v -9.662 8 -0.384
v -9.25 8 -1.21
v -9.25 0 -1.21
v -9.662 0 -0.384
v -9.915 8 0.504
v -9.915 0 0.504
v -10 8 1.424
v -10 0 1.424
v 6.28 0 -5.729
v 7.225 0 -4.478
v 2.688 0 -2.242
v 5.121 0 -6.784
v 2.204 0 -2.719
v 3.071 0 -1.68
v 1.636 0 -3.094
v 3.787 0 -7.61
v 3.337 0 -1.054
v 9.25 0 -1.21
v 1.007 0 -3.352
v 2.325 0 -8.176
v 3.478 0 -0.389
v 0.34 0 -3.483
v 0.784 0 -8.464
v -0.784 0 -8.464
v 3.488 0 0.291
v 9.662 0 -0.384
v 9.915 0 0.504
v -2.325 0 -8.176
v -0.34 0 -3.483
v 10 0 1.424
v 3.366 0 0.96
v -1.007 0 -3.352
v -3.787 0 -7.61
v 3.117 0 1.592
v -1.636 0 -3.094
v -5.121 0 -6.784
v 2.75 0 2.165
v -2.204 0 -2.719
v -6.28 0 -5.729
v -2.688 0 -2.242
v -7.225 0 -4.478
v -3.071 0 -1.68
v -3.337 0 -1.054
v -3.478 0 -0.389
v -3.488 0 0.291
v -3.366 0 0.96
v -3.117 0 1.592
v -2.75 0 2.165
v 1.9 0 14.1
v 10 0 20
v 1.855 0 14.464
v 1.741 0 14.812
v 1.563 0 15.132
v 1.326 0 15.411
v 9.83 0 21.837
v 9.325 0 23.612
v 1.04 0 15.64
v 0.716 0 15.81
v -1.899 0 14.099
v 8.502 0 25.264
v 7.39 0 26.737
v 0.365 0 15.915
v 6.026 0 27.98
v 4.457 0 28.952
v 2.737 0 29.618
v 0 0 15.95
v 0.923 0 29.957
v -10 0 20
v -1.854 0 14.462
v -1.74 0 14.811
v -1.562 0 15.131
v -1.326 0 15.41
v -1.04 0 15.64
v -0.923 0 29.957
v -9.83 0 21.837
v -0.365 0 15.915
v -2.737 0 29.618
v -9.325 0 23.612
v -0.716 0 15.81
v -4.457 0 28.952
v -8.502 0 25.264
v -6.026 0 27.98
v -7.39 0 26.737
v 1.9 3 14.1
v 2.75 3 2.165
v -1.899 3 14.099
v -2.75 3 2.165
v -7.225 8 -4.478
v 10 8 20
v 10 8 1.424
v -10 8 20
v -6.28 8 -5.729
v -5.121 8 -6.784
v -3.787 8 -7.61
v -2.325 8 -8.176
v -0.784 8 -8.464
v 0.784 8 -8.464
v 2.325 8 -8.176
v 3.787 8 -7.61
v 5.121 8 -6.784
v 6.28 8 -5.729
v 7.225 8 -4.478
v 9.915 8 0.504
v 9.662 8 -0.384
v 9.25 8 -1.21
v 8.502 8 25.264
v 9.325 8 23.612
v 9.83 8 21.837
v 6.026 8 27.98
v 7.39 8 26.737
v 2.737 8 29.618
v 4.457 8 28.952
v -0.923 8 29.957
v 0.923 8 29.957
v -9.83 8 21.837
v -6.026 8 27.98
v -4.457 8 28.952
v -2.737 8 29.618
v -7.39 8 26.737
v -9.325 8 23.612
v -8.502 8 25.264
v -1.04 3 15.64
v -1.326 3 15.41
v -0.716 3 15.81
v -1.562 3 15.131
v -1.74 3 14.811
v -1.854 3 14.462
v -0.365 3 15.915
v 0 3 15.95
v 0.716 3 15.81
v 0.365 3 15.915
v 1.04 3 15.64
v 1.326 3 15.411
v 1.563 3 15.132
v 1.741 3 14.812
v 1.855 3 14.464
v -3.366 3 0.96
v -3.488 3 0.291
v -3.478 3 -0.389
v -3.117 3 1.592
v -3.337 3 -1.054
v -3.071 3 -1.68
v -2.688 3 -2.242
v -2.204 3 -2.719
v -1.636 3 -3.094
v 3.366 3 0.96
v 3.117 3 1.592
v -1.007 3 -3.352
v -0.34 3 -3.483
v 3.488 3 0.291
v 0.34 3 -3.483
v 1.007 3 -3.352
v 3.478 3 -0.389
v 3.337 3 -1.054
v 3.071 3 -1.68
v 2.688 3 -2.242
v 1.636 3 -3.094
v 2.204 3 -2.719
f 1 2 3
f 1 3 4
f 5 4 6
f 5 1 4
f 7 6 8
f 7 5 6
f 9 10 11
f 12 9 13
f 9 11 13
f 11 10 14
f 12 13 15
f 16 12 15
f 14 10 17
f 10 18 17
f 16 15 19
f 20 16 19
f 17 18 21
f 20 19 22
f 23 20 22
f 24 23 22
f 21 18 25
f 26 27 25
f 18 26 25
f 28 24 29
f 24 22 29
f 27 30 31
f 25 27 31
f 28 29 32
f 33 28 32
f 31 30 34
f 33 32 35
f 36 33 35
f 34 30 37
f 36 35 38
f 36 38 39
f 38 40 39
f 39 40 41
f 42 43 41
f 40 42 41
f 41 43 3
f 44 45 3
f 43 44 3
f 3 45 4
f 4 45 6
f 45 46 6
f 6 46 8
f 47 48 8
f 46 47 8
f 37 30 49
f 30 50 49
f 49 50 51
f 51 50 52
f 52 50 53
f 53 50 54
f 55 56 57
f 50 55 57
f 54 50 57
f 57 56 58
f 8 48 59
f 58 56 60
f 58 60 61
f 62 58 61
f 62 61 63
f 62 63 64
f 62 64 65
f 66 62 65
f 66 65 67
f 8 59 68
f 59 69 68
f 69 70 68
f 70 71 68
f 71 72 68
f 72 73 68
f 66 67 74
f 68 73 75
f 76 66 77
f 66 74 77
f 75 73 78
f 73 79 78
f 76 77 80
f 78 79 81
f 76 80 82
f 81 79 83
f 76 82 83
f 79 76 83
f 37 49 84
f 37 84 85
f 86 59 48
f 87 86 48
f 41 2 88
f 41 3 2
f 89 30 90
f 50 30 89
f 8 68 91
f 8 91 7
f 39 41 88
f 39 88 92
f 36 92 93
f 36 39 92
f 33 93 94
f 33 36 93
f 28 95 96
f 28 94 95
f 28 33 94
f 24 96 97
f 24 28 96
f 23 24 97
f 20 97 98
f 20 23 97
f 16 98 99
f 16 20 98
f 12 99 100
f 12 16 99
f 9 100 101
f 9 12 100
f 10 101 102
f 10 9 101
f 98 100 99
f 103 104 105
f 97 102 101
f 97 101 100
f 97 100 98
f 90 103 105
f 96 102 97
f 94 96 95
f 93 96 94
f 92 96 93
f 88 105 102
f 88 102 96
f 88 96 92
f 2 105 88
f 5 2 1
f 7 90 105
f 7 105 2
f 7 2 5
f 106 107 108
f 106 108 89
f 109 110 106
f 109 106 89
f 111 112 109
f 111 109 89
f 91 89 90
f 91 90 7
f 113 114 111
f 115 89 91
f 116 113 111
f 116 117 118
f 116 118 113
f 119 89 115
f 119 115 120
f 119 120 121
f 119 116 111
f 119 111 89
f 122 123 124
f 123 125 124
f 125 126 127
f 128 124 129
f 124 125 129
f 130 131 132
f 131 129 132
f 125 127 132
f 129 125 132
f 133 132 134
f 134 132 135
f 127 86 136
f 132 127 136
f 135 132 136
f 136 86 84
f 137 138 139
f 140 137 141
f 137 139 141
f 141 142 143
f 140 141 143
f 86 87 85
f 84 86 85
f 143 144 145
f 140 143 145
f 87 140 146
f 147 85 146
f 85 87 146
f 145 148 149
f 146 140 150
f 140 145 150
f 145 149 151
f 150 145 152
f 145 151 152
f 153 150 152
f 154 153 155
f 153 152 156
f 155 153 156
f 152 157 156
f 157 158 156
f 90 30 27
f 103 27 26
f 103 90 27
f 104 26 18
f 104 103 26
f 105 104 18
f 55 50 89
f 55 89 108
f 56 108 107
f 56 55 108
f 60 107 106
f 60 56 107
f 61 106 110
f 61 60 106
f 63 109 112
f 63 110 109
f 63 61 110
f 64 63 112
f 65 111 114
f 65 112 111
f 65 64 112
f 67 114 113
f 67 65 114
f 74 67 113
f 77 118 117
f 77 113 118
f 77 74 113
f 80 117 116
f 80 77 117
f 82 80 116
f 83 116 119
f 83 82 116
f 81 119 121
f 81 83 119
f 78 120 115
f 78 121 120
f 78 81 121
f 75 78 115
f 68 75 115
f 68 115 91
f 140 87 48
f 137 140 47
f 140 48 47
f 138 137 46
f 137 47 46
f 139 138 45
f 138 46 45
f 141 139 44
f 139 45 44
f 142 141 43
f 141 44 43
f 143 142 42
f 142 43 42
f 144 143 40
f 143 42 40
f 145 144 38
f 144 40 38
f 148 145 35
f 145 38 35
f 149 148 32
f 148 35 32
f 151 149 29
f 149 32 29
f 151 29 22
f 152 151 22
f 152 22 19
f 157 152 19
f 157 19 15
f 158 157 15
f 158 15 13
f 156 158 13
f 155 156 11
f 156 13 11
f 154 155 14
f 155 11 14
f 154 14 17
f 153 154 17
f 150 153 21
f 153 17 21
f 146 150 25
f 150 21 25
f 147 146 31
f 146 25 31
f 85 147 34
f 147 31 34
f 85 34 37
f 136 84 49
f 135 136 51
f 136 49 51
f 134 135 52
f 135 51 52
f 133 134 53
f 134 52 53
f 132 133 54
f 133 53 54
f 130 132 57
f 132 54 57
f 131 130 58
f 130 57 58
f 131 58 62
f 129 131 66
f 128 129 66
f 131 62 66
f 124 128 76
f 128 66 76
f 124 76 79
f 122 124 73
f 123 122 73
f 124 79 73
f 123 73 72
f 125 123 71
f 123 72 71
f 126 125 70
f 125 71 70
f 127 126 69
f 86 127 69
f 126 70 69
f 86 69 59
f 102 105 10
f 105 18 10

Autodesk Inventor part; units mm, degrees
ref_plane "YZ Plane" through (0, 0, 0) normal (1, 0, 0) x (0, 1, 0)
ref_plane "XZ Plane" through (0, 0, 0) normal (0, 1, 0) x (-1, 0, 0)
ref_plane "XY Plane" through (0, 0, 0) normal (0, 0, 1) x (1, 0, 0)
sketch "Sketch1" plane through (0, 0, 0) normal (0, 1, 0) x (-1, 0, 0)
  arc A0 (-2.75, 2.1651) -> (2.75, 2.1651) centre (0, 0) ccw
  line L0 (-1.9, 14.1) -> (-2.75, 2.1651)
  line L1 (1.8987, 14.0987) -> (2.75, 2.1651)
  arc A1 (1.8987, 14.0987) -> (-1.9, 14.1) centre (-0.0007, 14.05) ccw
  circle A2 centre (0, 0) radius 0.5
  line L2 (0, 0) -> (0, -10) construction
  line L3 (0, 30) -> (0, 0) construction
  arc A3 (-7.6535, 3.6978) -> (7.6533, 3.6982) centre (0, 0) ccw
  line L4 (7.6533, 3.6982) -> (6.8916, 14.3762)
  arc A4 (6.8916, 14.3762) -> (-6.8928, 14.3783) centre (-0.0007, 14.05) ccw
  line L5 (-6.8928, 14.3783) -> (-7.6535, 3.6978)
  line L6 (10, 0) -> (-10, 0)
  line L7 (-10, 0) -> (-10, 30)
  line L8 (-10, 30) -> (10, 30)
  line L9 (10, 30) -> (10, 0)
  point P0 (-8.5, 0)
  point P1 (8.5, 0)
  dimension "d0" = 1
  dimension "d9" = 1.9
  dimension "d11" = 3.5
  dimension "d34" = 10
  dimension "d42" = 5
  dimension "d43" = 20
  dimension "d44" = 30
extrude "Extrusion6" add sketch "Sketch1" along normal blind 8 contours A0 L6 A3 L5 A4 L4 L1 A1 L0 | A0 L6 A3 | L6 L7 L8 L9 A3 L4 A4 L5
sketch "Sketch7" plane through (0, 0, 0) normal (0, -1, 0) x (1, 0, 0)
  arc A0 (-8.5, 0) -> (8.5, 0) centre (0, 0) ccw projected
  line L0 (10, 30) -> (10, 0) projected
  line L1 (-10, 0) -> (-10, 30) projected
  line L2 (-10, 0) -> (-10, 30) projected
  line L3 (-10, 0) -> (-7.225, -4.4777)
  line L4 (10, 0) -> (7.225, -4.4777)
  line L5 (8.5, 0) -> (10, 0)
  line L6 (-8.5, 0) -> (-10, 0) projected
  line L7 (-8.5, 0) -> (-10, 0)
extrude "Extrusion7" add sketch "Sketch7" against normal blind 8
fillet "Fillet1" radius 5 2 edges at (10, 4, 0) (-10, 4, 0)
sketch "Sketch8" plane through (0, 0, 0) normal (0, -1, 0) x (1, 0, 0)
  arc A0 (-10, 1.4237) -> (-9.25, -1.2102) centre (-5, 1.4237) ccw projected
  line L0 (-9.25, -1.2102) -> (-7.225, -4.4777) projected
  arc A1 (-7.225, -4.4777) -> (7.225, -4.4777) centre (0, 0) ccw projected
  line L1 (7.225, -4.4777) -> (9.25, -1.2102) projected
  arc A2 (9.25, -1.2102) -> (10, 1.4237) centre (5, 1.4237) ccw projected
  line L2 (10, 30) -> (10, 1.4237) projected
  line L3 (-10, 30) -> (10, 30) projected
  line L4 (-10, 1.4237) -> (-10, 30) projected
  arc A3 (-2.75, 2.1651) -> (2.75, 2.1651) centre (0, 0) ccw projected
  line L5 (-1.8987, 14.0987) -> (-2.75, 2.1651) projected
  arc A4 (1.9, 14.1) -> (-1.8987, 14.0987) centre (0.0007, 14.05) ccw projected
  line L6 (2.75, 2.1651) -> (1.9, 14.1) projected
  circle A5 centre (0, 20) radius 10
  line L7 (10, 30) -> (10, 1.4237) projected
  line L8 (-10, 30) -> (10, 30) projected
  point P0 (-10, 20)
  point P1 (0, 30)
  point P2 (10, 20)
  dimension "d50" = 20
extrude "Extrusion8" cut sketch "Sketch8" against normal through all contours L4 L3 A5 | L3 L2 A5
sketch "Sketch9" plane through (0, 8, 0) normal (0, 1, 0) x (1, 0, 0)
  arc A0 (-10, -20) -> (10, -20) centre (0, -20) ccw projected
  line L0 (-10, -1.4237) -> (-10, -20) projected
  arc A1 (-9.25, 1.2102) -> (-10, -1.4237) centre (-5, -1.4237) ccw projected
  line L1 (-7.225, 4.4777) -> (-9.25, 1.2102) projected
  arc A2 (7.225, 4.4777) -> (-7.225, 4.4777) centre (0, 0) ccw projected
  line L2 (9.25, 1.2102) -> (7.225, 4.4777) projected
  arc A3 (10, -1.4237) -> (9.25, 1.2102) centre (5, -1.4237) ccw projected
  line L3 (10, -20) -> (10, -1.4237) projected
extrude "Extrusion9" add sketch "Sketch9" against normal blind 5
properties part number "Servo_Shaft_select_V1"
